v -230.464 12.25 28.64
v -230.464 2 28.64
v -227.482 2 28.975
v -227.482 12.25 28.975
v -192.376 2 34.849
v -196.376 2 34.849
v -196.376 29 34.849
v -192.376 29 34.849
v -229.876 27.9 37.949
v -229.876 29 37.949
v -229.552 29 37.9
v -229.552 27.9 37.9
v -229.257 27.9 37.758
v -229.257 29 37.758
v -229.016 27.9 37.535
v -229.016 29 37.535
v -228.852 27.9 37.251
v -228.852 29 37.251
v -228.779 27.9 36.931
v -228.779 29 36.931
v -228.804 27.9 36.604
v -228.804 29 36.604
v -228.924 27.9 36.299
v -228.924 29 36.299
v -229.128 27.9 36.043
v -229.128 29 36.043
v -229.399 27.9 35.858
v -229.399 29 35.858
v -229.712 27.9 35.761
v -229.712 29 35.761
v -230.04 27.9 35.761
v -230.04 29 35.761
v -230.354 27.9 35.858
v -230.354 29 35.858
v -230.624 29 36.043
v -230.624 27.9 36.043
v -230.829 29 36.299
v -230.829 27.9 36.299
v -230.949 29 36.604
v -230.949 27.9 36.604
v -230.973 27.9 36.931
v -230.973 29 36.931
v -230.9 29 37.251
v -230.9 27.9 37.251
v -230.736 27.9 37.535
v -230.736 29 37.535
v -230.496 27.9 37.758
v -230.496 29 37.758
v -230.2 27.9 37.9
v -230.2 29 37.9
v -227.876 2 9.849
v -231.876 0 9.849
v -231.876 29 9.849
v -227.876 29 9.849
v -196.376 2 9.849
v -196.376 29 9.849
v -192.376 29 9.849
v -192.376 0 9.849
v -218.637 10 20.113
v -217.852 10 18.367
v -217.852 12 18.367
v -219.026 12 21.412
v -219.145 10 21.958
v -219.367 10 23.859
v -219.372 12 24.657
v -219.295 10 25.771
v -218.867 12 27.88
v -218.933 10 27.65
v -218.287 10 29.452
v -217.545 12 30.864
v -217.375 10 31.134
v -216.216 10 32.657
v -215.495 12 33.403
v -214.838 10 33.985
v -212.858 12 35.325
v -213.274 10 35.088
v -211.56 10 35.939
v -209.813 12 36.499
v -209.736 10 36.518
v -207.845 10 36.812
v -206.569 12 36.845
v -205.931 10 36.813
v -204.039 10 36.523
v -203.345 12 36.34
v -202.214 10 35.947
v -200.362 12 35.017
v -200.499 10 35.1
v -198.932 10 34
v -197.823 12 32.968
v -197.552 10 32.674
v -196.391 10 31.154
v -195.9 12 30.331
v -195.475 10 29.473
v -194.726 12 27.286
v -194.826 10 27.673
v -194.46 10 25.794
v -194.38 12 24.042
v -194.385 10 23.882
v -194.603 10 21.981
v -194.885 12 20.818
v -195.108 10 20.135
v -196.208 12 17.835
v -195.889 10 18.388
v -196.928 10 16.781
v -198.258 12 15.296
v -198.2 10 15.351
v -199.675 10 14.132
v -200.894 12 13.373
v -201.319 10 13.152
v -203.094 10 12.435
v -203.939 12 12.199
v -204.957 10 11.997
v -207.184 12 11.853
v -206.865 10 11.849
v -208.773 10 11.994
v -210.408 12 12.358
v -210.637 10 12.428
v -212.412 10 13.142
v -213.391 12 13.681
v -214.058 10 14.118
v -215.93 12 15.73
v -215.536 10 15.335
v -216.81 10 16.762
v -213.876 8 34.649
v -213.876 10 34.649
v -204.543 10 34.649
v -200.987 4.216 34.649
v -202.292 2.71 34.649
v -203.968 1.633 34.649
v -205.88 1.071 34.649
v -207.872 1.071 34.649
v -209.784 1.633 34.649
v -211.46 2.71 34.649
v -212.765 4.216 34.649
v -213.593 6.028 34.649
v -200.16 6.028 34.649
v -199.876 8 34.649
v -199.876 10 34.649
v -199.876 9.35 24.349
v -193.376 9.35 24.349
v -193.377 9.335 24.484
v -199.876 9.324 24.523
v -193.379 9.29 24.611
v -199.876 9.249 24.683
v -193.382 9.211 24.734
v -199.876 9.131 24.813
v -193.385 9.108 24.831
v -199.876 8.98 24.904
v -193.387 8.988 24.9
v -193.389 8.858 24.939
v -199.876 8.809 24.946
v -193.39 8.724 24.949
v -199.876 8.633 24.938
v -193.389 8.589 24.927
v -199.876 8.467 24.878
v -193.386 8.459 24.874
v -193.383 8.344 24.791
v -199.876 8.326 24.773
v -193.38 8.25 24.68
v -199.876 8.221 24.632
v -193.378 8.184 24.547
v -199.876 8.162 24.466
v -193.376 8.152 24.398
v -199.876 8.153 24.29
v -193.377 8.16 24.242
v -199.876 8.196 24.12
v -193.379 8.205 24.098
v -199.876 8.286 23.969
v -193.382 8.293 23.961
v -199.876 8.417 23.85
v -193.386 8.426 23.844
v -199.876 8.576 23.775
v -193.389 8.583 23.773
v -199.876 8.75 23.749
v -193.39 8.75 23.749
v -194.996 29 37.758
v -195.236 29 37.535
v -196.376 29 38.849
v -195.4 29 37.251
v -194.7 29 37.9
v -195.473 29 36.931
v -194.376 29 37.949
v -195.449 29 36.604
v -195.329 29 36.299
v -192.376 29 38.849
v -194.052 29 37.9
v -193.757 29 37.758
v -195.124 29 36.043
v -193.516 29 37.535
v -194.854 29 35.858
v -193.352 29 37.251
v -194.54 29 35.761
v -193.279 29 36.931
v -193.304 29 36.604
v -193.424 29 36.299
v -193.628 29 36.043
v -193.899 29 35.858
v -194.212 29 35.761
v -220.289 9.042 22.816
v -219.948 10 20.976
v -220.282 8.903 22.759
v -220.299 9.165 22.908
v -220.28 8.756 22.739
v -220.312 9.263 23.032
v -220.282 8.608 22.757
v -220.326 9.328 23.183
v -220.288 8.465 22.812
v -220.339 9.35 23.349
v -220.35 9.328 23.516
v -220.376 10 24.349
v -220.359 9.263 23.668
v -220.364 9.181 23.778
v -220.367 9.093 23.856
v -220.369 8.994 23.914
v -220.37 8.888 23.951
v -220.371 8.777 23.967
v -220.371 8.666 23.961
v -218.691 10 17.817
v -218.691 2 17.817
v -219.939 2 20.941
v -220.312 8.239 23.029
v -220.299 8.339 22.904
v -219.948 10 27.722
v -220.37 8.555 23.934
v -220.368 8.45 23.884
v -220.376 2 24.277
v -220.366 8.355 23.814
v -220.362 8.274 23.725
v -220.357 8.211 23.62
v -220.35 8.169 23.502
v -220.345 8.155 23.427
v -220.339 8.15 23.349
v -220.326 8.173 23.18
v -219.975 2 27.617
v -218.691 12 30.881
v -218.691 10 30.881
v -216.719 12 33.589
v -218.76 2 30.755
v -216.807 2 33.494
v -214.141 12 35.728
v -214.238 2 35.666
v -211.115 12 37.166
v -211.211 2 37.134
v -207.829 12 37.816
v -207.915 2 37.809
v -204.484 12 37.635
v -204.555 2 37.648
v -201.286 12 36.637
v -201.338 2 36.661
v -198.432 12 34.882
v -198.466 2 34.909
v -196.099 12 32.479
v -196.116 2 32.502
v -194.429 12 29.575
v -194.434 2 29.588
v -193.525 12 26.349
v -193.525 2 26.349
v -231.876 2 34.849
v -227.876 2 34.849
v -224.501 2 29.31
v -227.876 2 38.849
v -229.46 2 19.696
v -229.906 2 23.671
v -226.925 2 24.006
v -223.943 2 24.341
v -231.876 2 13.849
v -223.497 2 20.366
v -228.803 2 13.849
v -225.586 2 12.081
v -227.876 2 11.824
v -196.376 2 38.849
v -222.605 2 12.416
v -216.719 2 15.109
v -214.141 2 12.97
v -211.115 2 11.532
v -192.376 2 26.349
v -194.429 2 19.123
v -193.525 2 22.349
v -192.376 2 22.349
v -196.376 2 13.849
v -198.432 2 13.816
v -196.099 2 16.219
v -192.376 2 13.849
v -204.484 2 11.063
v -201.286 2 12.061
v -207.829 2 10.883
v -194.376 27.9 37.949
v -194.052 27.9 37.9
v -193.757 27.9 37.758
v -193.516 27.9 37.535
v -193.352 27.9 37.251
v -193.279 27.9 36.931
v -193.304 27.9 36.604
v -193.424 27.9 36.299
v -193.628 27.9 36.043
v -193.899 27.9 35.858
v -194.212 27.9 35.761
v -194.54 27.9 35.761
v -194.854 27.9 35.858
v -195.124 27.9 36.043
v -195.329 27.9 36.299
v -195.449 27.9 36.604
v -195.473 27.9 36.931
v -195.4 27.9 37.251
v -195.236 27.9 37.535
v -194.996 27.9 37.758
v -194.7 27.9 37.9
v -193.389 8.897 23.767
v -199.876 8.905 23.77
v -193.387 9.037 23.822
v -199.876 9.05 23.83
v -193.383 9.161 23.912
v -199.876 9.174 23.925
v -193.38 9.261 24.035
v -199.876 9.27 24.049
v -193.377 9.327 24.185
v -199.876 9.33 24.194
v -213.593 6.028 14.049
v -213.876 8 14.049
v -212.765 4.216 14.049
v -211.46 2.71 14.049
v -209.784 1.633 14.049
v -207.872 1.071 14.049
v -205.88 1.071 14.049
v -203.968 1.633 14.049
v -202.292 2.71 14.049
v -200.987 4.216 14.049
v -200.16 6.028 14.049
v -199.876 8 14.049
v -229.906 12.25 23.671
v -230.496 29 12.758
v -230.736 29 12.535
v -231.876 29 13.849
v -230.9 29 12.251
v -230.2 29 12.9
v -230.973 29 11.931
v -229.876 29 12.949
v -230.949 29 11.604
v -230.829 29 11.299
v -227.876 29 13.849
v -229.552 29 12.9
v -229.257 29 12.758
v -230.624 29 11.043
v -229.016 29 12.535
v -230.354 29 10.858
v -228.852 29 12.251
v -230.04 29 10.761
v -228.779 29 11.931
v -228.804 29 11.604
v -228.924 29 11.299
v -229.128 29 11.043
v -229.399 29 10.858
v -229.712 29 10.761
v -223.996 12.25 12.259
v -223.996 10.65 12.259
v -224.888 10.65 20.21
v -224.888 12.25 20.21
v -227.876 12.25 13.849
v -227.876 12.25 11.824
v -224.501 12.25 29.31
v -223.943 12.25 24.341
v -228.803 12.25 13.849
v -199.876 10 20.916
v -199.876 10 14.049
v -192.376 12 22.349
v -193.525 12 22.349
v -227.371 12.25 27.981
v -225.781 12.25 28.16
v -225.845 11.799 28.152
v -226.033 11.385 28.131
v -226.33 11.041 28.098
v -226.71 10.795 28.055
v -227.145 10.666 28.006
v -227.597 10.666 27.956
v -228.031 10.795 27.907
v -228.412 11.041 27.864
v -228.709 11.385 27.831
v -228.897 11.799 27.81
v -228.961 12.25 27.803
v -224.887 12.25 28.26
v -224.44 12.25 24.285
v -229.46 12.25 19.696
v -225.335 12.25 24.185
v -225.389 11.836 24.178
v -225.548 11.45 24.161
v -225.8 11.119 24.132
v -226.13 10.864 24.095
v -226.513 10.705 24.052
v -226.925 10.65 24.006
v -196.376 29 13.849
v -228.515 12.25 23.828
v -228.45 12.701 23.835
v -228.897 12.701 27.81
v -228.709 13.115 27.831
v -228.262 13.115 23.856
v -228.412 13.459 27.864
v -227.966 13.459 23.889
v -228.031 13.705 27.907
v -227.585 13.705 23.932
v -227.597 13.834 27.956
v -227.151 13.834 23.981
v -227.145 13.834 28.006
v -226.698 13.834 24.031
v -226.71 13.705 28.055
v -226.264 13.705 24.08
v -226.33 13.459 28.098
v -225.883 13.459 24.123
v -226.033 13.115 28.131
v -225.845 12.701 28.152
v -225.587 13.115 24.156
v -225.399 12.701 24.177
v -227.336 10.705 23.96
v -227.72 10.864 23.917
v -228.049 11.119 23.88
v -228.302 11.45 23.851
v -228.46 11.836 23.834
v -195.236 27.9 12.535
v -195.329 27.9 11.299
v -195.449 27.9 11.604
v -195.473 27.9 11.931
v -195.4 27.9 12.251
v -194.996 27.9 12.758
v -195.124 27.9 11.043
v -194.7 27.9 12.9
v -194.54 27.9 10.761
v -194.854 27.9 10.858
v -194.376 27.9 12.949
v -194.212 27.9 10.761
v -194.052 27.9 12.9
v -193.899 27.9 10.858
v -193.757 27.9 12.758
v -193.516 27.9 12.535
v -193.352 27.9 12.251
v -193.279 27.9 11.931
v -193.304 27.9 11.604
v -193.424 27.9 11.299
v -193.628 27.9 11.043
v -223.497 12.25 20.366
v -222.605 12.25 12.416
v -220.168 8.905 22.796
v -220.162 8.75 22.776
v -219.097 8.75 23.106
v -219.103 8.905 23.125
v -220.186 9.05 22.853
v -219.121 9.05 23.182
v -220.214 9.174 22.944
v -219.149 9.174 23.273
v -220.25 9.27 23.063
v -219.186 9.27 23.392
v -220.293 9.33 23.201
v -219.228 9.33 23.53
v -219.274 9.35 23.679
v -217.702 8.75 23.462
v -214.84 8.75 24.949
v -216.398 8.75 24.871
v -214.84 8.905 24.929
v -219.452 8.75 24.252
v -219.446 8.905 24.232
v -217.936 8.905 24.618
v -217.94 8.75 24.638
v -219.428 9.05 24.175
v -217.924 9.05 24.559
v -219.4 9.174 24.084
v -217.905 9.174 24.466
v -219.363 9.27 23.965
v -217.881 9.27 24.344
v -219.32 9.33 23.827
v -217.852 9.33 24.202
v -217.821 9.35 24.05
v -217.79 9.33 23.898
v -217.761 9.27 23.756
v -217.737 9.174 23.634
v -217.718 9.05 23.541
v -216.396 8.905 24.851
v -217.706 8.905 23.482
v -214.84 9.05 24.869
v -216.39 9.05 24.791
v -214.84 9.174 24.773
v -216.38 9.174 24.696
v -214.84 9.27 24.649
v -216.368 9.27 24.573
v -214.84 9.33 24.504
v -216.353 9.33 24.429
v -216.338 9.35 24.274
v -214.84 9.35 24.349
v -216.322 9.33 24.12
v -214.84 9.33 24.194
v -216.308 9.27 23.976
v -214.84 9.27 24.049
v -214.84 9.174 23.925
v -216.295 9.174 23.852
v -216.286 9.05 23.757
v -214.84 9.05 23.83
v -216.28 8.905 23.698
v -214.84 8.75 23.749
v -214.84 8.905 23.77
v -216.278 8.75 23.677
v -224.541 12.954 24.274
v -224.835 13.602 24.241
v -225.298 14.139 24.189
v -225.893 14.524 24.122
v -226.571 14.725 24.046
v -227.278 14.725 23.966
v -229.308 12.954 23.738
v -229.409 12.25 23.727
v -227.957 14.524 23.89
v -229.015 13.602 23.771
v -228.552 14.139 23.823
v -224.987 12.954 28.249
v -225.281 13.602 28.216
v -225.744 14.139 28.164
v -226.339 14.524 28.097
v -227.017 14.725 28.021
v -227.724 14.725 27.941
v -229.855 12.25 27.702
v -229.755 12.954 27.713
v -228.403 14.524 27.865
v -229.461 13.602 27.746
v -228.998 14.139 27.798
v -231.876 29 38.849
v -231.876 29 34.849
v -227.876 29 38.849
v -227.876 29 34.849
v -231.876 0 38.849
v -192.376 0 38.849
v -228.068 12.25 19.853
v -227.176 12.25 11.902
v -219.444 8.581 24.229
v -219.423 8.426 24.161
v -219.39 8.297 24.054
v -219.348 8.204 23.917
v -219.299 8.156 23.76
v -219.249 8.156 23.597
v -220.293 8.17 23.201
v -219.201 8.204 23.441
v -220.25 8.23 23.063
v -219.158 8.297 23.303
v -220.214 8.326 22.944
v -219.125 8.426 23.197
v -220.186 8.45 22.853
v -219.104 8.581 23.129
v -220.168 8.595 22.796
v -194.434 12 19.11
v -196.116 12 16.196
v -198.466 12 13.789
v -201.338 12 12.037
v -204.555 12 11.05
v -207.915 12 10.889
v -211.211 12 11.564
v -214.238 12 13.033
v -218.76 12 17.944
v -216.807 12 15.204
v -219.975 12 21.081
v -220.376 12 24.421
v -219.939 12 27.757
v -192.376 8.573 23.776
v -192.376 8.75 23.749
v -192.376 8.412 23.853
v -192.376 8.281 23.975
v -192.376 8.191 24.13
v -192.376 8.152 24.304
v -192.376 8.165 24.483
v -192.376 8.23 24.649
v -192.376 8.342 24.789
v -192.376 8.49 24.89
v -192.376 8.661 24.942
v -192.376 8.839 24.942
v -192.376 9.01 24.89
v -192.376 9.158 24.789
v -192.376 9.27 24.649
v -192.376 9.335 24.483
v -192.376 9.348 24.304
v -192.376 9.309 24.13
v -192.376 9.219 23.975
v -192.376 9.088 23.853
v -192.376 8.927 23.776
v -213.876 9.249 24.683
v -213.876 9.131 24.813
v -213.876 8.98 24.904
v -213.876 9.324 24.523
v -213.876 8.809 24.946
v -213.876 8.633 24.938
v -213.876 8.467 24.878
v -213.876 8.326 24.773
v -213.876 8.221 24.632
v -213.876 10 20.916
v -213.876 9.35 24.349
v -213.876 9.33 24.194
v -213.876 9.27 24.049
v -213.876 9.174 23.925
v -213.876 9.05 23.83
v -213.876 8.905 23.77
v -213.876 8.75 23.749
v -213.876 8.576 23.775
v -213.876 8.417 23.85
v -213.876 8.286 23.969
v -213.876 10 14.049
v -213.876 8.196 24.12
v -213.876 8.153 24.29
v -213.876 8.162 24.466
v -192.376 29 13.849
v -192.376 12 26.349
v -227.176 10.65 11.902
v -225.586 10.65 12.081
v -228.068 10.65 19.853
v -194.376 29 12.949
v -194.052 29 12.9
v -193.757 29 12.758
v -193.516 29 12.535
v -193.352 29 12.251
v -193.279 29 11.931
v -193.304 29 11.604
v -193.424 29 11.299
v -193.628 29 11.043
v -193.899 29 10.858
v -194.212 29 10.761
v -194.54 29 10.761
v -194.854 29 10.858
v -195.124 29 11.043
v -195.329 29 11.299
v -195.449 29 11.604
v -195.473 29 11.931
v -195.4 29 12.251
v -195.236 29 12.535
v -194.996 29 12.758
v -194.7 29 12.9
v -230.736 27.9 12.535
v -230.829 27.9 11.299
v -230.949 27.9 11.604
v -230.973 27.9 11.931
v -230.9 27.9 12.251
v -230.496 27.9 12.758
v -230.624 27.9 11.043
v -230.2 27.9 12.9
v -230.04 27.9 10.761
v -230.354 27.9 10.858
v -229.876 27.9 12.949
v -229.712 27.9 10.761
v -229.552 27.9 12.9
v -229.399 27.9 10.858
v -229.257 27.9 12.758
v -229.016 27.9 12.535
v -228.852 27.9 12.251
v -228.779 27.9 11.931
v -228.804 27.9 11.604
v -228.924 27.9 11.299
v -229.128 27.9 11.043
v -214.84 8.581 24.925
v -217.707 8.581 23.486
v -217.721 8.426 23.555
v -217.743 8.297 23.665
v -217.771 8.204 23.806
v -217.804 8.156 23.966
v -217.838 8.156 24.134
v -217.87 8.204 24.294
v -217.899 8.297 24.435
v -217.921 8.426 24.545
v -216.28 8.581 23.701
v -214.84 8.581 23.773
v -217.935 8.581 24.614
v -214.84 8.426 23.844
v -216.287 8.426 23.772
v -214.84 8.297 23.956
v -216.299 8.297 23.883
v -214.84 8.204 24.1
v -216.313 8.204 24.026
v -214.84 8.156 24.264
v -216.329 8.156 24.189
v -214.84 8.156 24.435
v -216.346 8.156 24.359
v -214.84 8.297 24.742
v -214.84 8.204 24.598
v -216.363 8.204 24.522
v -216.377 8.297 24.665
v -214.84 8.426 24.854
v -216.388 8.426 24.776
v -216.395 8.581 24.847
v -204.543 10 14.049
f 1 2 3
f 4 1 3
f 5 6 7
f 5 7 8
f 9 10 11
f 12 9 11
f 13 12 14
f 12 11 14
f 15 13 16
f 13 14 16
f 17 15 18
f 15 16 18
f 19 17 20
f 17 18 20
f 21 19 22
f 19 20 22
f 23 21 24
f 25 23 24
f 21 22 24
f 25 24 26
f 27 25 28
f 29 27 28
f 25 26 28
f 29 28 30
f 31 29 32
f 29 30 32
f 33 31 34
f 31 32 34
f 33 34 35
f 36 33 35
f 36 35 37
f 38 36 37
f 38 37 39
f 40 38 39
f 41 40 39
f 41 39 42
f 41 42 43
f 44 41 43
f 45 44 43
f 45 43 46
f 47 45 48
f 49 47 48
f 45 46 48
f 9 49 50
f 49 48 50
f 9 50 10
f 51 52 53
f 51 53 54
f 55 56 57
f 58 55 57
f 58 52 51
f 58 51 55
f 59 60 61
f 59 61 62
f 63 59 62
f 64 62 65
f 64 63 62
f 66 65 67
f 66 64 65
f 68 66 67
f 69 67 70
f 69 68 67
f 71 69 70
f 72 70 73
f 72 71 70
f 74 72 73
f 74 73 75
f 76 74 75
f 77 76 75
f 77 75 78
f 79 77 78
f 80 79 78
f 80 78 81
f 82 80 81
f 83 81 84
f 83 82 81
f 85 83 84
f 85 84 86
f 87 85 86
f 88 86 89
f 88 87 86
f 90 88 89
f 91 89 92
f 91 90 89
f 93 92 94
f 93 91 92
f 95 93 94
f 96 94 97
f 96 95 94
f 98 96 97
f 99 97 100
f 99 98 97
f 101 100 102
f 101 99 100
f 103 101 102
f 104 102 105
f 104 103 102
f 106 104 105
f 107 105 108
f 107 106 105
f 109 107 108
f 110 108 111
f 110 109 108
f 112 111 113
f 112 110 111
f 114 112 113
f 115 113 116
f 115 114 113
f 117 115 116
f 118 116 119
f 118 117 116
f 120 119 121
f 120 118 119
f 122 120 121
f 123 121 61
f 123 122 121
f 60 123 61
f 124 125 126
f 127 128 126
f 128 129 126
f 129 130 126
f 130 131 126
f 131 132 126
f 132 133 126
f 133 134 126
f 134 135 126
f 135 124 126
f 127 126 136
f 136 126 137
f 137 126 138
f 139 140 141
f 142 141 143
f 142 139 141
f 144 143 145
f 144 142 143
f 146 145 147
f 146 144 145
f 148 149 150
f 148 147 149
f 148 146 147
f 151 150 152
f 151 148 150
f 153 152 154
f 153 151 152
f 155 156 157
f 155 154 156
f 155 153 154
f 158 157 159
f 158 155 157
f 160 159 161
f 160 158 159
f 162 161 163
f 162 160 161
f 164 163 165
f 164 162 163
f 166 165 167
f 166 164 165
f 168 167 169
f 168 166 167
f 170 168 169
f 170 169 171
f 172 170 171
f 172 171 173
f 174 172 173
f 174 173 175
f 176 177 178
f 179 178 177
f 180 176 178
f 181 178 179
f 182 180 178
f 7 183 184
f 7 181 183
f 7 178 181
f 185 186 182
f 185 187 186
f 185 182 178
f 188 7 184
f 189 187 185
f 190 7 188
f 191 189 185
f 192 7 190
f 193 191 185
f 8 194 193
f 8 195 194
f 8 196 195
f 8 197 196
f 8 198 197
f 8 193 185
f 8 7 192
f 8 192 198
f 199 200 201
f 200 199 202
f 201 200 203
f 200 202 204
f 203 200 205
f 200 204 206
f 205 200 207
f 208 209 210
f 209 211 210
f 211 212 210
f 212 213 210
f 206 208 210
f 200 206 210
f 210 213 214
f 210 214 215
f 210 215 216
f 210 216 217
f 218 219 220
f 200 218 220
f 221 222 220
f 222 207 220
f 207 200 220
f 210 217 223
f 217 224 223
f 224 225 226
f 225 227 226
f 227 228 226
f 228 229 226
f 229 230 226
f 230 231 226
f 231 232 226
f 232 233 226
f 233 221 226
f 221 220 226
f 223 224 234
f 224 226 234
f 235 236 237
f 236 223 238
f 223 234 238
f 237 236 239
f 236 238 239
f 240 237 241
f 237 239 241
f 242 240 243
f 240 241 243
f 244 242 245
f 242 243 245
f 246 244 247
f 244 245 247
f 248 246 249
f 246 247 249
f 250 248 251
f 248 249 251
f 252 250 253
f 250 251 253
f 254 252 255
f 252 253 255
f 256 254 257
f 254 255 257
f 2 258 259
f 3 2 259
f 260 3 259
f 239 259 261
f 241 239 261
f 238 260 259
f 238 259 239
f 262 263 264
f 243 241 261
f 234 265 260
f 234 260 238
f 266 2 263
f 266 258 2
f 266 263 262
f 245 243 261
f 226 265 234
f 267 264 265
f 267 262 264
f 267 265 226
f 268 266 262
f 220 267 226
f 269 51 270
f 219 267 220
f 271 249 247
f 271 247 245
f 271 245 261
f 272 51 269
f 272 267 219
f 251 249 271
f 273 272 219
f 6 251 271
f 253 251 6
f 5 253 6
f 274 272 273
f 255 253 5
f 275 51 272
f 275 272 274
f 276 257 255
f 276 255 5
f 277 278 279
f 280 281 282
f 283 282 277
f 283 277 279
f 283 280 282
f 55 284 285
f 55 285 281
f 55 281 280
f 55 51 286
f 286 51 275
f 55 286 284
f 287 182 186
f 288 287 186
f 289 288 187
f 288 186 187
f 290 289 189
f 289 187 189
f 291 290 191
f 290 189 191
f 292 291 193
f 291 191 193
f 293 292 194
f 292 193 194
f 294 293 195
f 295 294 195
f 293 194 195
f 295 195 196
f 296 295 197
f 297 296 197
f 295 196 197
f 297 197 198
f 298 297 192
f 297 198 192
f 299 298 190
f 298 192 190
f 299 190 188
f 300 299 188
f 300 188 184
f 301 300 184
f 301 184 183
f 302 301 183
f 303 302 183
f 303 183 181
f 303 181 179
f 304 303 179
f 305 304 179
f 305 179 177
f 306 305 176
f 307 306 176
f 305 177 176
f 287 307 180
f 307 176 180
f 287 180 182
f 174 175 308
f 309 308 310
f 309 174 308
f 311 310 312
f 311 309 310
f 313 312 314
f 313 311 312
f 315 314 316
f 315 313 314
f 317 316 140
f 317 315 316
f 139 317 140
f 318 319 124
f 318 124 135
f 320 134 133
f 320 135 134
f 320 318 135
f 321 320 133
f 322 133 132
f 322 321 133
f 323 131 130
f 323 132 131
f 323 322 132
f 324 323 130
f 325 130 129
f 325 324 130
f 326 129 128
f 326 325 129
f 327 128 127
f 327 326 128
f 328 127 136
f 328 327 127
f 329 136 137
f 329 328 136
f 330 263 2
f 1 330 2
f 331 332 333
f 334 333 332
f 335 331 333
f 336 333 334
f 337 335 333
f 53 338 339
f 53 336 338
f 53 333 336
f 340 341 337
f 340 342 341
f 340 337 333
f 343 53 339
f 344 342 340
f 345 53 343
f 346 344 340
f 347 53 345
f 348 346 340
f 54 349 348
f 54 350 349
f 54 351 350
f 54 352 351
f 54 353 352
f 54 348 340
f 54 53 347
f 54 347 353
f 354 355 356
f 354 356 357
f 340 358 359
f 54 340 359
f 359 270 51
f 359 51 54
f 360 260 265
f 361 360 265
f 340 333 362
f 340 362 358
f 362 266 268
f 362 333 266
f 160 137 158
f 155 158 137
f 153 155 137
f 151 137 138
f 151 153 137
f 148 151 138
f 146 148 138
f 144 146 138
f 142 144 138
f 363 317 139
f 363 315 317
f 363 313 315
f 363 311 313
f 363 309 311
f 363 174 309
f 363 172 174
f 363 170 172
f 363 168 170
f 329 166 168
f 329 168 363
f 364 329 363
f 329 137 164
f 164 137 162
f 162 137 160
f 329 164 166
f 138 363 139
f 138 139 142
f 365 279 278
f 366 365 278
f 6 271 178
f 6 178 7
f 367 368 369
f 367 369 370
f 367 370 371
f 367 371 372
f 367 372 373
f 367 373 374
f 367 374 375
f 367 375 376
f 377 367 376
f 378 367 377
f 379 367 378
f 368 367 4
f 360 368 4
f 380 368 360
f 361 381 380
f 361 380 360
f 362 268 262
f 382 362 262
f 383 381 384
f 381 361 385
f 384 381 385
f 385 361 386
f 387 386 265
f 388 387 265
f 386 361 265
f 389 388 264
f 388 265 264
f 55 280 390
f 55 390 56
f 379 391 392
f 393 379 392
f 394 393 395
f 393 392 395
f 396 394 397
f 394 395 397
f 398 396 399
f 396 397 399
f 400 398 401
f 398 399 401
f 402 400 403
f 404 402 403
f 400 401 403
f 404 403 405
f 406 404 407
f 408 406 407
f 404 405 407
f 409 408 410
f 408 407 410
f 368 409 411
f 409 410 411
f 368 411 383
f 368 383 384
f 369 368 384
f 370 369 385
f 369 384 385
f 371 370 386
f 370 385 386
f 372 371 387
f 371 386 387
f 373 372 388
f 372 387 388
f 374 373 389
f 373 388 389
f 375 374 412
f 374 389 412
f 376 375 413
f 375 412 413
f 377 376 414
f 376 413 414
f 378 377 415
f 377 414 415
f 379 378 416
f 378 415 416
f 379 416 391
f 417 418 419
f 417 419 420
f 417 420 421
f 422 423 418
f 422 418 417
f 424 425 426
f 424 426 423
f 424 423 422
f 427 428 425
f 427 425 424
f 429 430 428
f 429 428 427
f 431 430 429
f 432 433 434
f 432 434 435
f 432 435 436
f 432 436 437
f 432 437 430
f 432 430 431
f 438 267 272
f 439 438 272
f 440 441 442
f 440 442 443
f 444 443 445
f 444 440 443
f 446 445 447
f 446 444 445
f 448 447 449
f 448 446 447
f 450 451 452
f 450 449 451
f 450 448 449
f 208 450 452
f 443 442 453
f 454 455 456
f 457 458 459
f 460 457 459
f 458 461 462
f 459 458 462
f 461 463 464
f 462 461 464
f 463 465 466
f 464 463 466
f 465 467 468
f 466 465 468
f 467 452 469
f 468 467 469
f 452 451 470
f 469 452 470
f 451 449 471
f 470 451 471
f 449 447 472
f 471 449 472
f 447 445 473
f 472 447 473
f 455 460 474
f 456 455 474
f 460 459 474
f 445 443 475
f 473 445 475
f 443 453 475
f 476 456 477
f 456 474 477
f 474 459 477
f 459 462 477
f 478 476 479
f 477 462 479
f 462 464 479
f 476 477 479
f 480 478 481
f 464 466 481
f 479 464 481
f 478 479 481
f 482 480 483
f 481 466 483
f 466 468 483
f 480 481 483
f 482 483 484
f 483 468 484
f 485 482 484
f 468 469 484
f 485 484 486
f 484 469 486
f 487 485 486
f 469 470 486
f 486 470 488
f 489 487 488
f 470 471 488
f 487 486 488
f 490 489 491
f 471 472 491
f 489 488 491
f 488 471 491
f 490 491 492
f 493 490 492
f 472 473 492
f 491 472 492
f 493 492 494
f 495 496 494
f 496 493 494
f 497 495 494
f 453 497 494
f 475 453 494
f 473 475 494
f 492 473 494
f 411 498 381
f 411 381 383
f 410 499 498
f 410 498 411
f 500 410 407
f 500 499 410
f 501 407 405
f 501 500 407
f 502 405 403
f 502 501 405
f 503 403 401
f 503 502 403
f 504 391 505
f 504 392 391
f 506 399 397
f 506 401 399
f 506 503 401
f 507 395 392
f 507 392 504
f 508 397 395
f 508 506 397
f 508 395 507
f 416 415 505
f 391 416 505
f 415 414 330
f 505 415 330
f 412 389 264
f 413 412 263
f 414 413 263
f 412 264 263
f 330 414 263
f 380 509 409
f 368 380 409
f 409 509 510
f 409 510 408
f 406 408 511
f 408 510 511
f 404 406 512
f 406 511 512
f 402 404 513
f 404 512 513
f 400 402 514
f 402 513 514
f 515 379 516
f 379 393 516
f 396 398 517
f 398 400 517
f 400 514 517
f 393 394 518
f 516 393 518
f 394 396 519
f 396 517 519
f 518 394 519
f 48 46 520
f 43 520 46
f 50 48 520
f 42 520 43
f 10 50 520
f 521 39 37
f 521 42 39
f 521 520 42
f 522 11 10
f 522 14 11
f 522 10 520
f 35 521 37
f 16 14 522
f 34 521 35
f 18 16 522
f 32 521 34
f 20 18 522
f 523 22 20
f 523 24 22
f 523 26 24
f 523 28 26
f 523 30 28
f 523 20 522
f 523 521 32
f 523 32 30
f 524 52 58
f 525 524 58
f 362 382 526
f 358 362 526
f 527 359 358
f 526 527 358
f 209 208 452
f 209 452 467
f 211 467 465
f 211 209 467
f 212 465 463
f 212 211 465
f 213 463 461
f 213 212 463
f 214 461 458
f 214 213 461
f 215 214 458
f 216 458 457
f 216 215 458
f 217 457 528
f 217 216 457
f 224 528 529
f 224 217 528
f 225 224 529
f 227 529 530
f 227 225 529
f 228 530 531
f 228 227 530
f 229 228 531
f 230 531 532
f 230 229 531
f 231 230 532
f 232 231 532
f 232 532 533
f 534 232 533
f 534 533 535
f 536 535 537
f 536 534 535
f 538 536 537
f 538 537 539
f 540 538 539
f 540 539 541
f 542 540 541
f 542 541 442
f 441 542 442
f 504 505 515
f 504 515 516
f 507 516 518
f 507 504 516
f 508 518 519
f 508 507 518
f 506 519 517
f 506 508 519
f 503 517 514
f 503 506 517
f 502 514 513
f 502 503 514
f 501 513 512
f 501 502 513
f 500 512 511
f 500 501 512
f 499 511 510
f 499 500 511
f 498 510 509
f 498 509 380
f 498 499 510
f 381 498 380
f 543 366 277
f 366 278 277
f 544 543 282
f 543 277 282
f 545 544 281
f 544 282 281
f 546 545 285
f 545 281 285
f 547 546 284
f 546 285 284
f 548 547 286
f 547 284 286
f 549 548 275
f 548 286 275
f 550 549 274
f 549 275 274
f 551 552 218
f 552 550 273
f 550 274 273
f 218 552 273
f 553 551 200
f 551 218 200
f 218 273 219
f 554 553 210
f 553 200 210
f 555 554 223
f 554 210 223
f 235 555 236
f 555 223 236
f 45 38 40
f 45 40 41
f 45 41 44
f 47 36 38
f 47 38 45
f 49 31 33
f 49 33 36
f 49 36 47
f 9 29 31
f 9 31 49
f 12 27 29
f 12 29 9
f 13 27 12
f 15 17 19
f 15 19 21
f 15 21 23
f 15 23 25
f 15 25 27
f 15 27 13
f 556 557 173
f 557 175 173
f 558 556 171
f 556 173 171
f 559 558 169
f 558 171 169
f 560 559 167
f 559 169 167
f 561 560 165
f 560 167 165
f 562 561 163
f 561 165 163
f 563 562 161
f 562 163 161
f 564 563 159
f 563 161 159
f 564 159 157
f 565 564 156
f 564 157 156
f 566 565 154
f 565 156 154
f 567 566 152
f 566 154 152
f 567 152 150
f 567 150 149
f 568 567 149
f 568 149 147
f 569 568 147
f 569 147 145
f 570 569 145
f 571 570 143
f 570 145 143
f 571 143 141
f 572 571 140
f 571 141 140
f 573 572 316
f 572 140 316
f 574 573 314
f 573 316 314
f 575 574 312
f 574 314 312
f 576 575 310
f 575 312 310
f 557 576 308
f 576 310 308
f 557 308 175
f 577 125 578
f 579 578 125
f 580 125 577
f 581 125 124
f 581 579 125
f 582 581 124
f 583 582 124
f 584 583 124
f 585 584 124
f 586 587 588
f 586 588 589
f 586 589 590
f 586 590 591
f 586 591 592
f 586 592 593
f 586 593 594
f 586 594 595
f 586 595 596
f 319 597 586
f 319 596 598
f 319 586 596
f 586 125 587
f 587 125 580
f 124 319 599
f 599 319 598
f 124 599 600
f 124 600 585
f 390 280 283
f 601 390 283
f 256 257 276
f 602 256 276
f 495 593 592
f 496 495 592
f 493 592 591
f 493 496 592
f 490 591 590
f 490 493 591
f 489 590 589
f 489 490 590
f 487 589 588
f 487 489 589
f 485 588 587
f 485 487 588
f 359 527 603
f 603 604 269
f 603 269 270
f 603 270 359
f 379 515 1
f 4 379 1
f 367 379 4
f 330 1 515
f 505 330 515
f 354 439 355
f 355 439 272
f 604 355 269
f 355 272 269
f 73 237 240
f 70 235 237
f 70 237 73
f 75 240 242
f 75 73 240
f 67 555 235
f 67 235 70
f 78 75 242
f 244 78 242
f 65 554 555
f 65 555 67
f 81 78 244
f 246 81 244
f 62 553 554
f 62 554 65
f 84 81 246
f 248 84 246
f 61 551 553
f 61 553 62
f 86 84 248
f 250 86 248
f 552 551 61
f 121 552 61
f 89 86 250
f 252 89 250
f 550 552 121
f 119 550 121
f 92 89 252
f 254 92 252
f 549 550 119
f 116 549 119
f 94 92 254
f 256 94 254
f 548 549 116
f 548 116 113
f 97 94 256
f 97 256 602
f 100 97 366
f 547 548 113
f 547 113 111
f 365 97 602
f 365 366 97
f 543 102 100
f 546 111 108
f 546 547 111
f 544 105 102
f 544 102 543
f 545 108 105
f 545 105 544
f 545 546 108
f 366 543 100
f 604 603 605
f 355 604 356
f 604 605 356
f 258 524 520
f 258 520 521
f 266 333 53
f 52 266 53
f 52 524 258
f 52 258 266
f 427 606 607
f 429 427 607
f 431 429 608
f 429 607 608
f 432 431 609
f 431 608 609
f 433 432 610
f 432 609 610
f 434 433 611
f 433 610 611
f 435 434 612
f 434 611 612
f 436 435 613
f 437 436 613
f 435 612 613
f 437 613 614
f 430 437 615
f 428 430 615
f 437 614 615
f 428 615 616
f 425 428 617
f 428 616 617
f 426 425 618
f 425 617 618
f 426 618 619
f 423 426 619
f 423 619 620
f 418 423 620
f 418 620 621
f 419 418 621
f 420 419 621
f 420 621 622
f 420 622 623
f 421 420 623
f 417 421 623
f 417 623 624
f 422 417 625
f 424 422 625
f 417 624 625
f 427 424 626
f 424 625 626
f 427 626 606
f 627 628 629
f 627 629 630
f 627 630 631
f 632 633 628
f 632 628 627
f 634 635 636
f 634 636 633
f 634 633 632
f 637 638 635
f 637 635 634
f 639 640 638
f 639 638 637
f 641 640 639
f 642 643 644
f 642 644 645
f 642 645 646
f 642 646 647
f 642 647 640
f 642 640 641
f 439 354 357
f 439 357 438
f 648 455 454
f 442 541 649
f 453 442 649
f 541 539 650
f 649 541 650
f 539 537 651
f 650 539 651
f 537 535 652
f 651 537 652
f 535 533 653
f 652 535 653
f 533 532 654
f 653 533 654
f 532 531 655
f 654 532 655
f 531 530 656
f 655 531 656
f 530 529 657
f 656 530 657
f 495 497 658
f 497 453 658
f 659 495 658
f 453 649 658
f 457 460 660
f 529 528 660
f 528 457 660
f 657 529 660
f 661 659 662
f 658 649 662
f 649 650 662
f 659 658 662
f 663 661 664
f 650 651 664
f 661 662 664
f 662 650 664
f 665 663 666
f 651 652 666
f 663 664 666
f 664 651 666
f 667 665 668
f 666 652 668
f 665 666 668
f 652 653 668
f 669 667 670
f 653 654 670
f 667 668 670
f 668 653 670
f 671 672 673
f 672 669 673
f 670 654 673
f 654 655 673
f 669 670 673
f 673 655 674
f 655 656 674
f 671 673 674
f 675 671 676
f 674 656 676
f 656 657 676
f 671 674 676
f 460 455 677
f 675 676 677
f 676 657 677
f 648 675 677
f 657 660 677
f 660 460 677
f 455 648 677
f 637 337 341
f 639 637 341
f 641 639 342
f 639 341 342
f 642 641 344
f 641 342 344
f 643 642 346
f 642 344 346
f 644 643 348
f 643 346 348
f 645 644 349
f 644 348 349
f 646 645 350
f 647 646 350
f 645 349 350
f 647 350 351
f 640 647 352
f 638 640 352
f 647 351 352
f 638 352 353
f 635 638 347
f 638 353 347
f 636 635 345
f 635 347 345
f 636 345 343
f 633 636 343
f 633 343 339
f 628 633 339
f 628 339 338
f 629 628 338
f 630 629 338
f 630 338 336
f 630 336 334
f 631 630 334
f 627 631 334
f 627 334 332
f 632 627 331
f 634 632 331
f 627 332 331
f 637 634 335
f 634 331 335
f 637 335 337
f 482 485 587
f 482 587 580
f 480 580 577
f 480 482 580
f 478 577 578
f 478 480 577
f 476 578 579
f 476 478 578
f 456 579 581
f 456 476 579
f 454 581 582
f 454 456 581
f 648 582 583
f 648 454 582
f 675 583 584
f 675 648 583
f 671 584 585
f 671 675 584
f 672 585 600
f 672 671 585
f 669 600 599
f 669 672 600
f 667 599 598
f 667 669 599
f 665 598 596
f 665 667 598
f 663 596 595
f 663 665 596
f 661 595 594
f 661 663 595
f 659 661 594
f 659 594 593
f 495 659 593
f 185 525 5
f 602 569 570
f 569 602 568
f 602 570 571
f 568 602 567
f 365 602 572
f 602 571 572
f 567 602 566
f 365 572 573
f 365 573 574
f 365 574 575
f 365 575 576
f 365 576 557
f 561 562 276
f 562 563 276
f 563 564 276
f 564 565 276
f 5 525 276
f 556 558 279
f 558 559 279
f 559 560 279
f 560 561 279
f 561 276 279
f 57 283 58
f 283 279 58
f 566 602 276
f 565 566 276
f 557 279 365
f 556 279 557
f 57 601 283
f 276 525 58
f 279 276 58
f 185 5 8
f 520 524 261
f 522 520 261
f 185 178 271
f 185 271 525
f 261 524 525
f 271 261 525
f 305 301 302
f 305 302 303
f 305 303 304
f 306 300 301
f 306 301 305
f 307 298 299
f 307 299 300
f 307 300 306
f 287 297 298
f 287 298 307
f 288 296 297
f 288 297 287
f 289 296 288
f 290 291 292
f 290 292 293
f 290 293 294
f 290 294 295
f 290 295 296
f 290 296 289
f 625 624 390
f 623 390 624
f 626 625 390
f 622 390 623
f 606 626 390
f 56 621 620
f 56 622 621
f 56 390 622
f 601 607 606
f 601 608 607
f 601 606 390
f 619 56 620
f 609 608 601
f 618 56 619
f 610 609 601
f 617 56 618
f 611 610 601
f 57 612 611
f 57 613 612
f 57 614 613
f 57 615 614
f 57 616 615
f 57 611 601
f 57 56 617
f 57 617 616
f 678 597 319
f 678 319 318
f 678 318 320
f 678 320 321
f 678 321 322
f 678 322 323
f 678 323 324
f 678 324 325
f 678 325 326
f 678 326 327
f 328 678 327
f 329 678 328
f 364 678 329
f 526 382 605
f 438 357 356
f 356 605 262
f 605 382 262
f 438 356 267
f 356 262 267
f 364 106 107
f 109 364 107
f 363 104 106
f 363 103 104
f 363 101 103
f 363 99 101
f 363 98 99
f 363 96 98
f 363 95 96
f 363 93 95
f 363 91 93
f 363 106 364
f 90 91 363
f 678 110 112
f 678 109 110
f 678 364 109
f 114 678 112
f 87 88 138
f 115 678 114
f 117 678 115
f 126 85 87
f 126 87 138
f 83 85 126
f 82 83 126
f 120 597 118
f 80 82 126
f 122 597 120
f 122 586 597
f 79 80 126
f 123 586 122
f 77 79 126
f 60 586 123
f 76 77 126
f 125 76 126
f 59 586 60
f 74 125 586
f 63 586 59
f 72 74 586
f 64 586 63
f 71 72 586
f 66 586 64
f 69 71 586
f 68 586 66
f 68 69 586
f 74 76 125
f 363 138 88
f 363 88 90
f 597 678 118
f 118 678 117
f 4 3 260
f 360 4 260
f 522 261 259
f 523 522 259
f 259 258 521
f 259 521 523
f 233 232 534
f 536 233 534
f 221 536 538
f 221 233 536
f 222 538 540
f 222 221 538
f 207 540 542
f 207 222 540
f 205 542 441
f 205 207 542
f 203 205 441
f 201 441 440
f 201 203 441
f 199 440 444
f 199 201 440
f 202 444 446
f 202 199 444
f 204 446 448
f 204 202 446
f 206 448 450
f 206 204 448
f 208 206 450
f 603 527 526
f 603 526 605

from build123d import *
from build123d.topology import SkipClean

# Parameters (mm, degrees)
SKETCH1_W              = 39.5
SKETCH1_H              = 29
BOSS_EXTRUDE1_DEPTH    = 2
SKETCH2_R              = 13.5
SKETCH2_R_2            = 8.5
BOSS_EXTRUDE2_DEPTH    = 10
SKETCH3_R              = 12.5
CUT_EXTRUDE1_DEPTH     = 2
SKETCH4_R              = 7.5
CUT_EXTRUDE2_DEPTH     = 9
CUT_EXTRUDE3_START     = -10.3
CUT_EXTRUDE3_DEPTH     = 20.6
BOSS_EXTRUDE3_DEPTH    = 10
SKETCH10_W             = 39.5
SKETCH10_H             = 29
SKETCH10_R             = 13.5
CUT_EXTRUDE4_DEPTH     = 10
SKETCH11_R             = 13.5
SKETCH11_W             = 14
SKETCH11_H             = 20.6
BOSS_EXTRUDE4_DEPTH    = 8
SKETCH12_R             = 13.5
SKETCH12_R_2           = 12.5
BOSS_EXTRUDE5_DEPTH    = 2
CUT_SWEEP2_START       = -214.83981443
CUT_SWEEP2_OUTLINE_R   = 0.6
CUT_SWEEP2_DEPTH       = 22.83981443
CUT_SWEEP2_2_OUTLINE_R = 0.6
CUT_SWEEP2_2_ANGLE     = 17.195102
CUT_SWEEP2_START_2     = -205
CUT_SWEEP2_3_OUTLINE_R = 0.6
CUT_SWEEP2_3_DEPTH     = 2.526605635
BOSS_EXTRUDE7_DEPTH    = 10.25
CUT_EXTRUDE5_DEPTH     = 8
SKETCH20_R             = 1.6
CUT_EXTRUDE6_DEPTH     = 4
SKETCH21_R             = 2.5
SKETCH21_R_2           = 1.6
BOSS_EXTRUDE8_DEPTH    = 4
SKETCH22_W             = 4
SKETCH22_H             = 4
BOSS_EXTRUDE9_DEPTH    = 27
BOSS_EXTRUDE11_DEPTH   = 10
SKETCH8_2_R            = 0.6
SKETCH24_R             = 1.1
CUT_EXTRUDE7_DEPTH     = 1.1


with BuildPart() as part:
    # Sketch1 → Boss-Extrude1 (new body)
    with BuildSketch(Plane(origin=(0, 0, 0), x_dir=(1, 0, 0), z_dir=(0, 1, 0))):
        with Locations((-212.126239175, -24.349172792)):
            Rectangle(SKETCH1_W, SKETCH1_H)
    extrude(amount=BOSS_EXTRUDE1_DEPTH)

    # Sketch2 → Boss-Extrude2 (add)
    with BuildSketch(Plane(origin=(0, 2, 0), x_dir=(1, 0, 0), z_dir=(0, 1, 0))):
        with Locations((-206.876239175, -24.349172792)):
            Circle(SKETCH2_R)
        with Locations((-222.376239175, -24.349172792)):
            Circle(SKETCH2_R_2)
    extrude(amount=BOSS_EXTRUDE2_DEPTH)

    # Sketch3 → Cut-Extrude1 (cut)
    with BuildSketch(Plane(origin=(0, 12, 0), x_dir=(1, 0, 0), z_dir=(0, 1, 0))):
        with Locations(Location((-206.876239175, -24.349172792, 0), (0, 0, 270))):
            Circle(SKETCH3_R)
    extrude(amount=-CUT_EXTRUDE1_DEPTH, mode=Mode.SUBTRACT)

    # Sketch4 → Cut-Extrude2 (cut)
    with BuildSketch(Plane(origin=(0, 12, 0), x_dir=(1, 0, 0), z_dir=(0, 1, 0))):
        with Locations(Location((-222.376239175, -24.349172792, 0), (0, 0, 270))):
            Circle(SKETCH4_R)
    extrude(amount=-CUT_EXTRUDE2_DEPTH, mode=Mode.SUBTRACT)

    # Cut-Extrude3: read off the stored shape, not the designer's step
    # Cut-Extrude3 outline → Cut-Extrude3 (cut)
    with BuildSketch(Plane.XY.offset(24.349172792).offset(CUT_EXTRUDE3_START)):
        with BuildLine():
            ThreePointArc((-213.876239175, 8), (-206.876239175, 1), (-199.876239175, 8))
            Line((-199.876239175, 8), (-199.876239175, 10))
            Line((-199.876239175, 10), (-213.876239175, 10))
            Line((-213.876239175, 10), (-213.876239175, 8))
        make_face()
    extrude(amount=CUT_EXTRUDE3_DEPTH, mode=Mode.SUBTRACT)

    # Sketch7 → Boss-Extrude3 (add)
    with BuildSketch(Plane(origin=(0, 2, 0), x_dir=(1, 0, 0), z_dir=(0, 1, 0))):
        with BuildLine():
            Line((-192.376239175, -26.349172792), (-192.376239175, -24.349172792))
            Line((-192.376239175, -24.349172792), (-192.376239175, -22.349172792))
            Line((-192.376239175, -22.349172792), (-193.525209252, -22.349172792))
            ThreePointArc((-193.525209252, -22.349172792), (-193.413533207, -23.346402619), (-193.376239175, -24.349172792))
            ThreePointArc((-193.376239175, -24.349172792), (-193.413533207, -25.351942966), (-193.525209252, -26.349172792))
            Line((-193.525209252, -26.349172792), (-192.376239175, -26.349172792))
        make_face()
    extrude(amount=BOSS_EXTRUDE3_DEPTH)

    # Sketch10 → Cut-Extrude4 (cut)
    with BuildSketch(Plane(origin=(0, 2, 0), x_dir=(1, 0, 0), z_dir=(0, 1, 0))):
        with Locations((-212.126239175, -24.349172792)):
            Rectangle(SKETCH10_W, SKETCH10_H)
        with Locations(Location((-206.876239175, -24.349172792, 0), (0, 0, 151.062655238))):
            Circle(SKETCH10_R, mode=Mode.SUBTRACT)
    extrude(amount=CUT_EXTRUDE4_DEPTH, mode=Mode.SUBTRACT)

    # Sketch11 → Boss-Extrude4 (add)
    with BuildSketch(Plane(origin=(0, 2, 0), x_dir=(1, 0, 0), z_dir=(0, 1, 0))):
        with Locations(Location((-206.876239175, -24.349172792, 0), (0, 0, 151.062655238))):
            Circle(SKETCH11_R)
        with Locations((-206.876239175, -24.349172792)):
            Rectangle(SKETCH11_W, SKETCH11_H, mode=Mode.SUBTRACT)
    extrude(amount=BOSS_EXTRUDE4_DEPTH)

    # Sketch12 → Boss-Extrude5 (add)
    with SkipClean():  # the faces are left unmerged after this step: merging them gives an invalid solid
        with BuildSketch(Plane(origin=(0, 10, 0), x_dir=(1, 0, 0), z_dir=(0, 1, 0))):
            with Locations(Location((-206.876239175, -24.349172792, 0), (0, 0, 270))):
                Circle(SKETCH12_R)
            with Locations(Location((-206.876239175, -24.349172792, 0), (0, 0, 270))):
                Circle(SKETCH12_R_2, mode=Mode.SUBTRACT)
        extrude(amount=BOSS_EXTRUDE5_DEPTH)
    add(part.part.scale(1), mode=Mode.REPLACE)  # the faces are merged on a copy

    # Cut-Sweep2: read off the stored shape, not the designer's step
    # Cut-Sweep2 outline → Cut-Sweep2 (cut)
    with SkipClean():  # the faces are left unmerged after this step: merging them gives an invalid solid
        with BuildSketch(Plane.YZ.offset(CUT_SWEEP2_START)):
            with Locations((8.75, 24.349172792)):
                Circle(CUT_SWEEP2_OUTLINE_R)
        extrude(amount=CUT_SWEEP2_DEPTH, mode=Mode.SUBTRACT)

    # Cut-Sweep2 2 outline → Cut-Sweep2 2 (revolve, cut)
    with SkipClean():  # the faces are left unmerged after this step: merging them gives an invalid solid
        with BuildSketch(Plane(origin=(-214.83981433, 0, 9.349172792), x_dir=(-0.2956263792524328, 0, 0.9553036396298806), z_dir=(-0.9553036396298806, 0, -0.2956263792524328))):
            with Locations((15, 8.75)):
                Circle(CUT_SWEEP2_2_OUTLINE_R)
        revolve(axis=Axis((-214.83981433, 0, 9.349172792), (0, 1, 0)), revolution_arc=CUT_SWEEP2_2_ANGLE, mode=Mode.SUBTRACT)

    # Cut-Sweep2 3 outline → Cut-Sweep2 3 (cut)
    with SkipClean():  # the faces are left unmerged after this step: merging them gives an invalid solid
        with BuildSketch(Plane(origin=(0, 0, 0), x_dir=(0, 1, 0), z_dir=(0.9553036396298961, 0, 0.29562637925238305)).offset(CUT_SWEEP2_START_2)):
            with Locations((8.75, 87.443615225)):
                Circle(CUT_SWEEP2_3_OUTLINE_R)
        extrude(amount=CUT_SWEEP2_3_DEPTH, mode=Mode.SUBTRACT)

    # Sketch18 → Boss-Extrude7 (add)
    with SkipClean():  # the faces are left unmerged after this step: merging them gives an invalid solid
        with BuildSketch(Plane(origin=(0, 2, 0), x_dir=(1, 0, 0), z_dir=(0, 1, 0))):
            Polygon((-228.567210955, -11.746276031), (-229.459691419, -19.696337579), (-226.478418338, -20.031017753), (-225.585937874, -12.080956204), align=None)
            Polygon((-225.585937874, -12.080956204), (-226.478418338, -20.031017753), (-223.497145257, -20.365697927), (-222.604664794, -12.415636378), align=None)
            Polygon((-227.482458859, -28.974836995), (-226.92465857, -24.006048527), (-229.90593165, -23.671368353), (-230.46373194, -28.640156821), align=None)
            Polygon((-223.943385489, -24.340728701), (-226.92465857, -24.006048527), (-227.482458859, -28.974836995), (-224.501185779, -29.309517169), align=None)
        extrude(amount=BOSS_EXTRUDE7_DEPTH)

    # Sketch19 → Cut-Extrude5 (cut)
    with SkipClean():  # the faces are left unmerged after this step: merging them gives an invalid solid
        with BuildSketch(Plane(origin=(-5.039382401, 0, 44.889946486), x_dir=(0.9937576935397466, 0, 0.11156005795338761), z_dir=(-0.11156005795338761, 0, 0.9937576935397466))):
            Polygon((-222.830009143, 12.25), (-224.430009143, 12.25), (-224.430009143, 10.65), (-221.230009143, 10.65), (-221.230009143, 12.25), align=None)
        extrude(amount=-CUT_EXTRUDE5_DEPTH, mode=Mode.SUBTRACT)

    # Sketch20 → Cut-Extrude6 (cut)
    with SkipClean():  # the faces are left unmerged after this step: merging them gives an invalid solid
        with BuildSketch(Plane(origin=(-5.485622633, 0, 48.864977261), x_dir=(-0.9937576935397466, 0, -0.11156005795338761), z_dir=(0.11156005795338761, 0, -0.9937576935397466))):
            with Locations((222.830009143, 12.25)):
                Circle(SKETCH20_R)
        extrude(amount=-CUT_EXTRUDE6_DEPTH, mode=Mode.SUBTRACT)

    # Sketch21 → Boss-Extrude8 (add)
    with SkipClean():  # the faces are left unmerged after this step: merging them gives an invalid solid
        with BuildSketch(Plane(origin=(-5.485622633, 0, 48.864977261), x_dir=(-0.9937576935397466, 0, -0.11156005795338761), z_dir=(0.11156005795338761, 0, -0.9937576935397466))):
            with Locations((222.830009143, 12.25)):
                Circle(SKETCH21_R)
            with Locations((222.830009143, 12.25)):
                Circle(SKETCH21_R_2, mode=Mode.SUBTRACT)
        extrude(amount=-BOSS_EXTRUDE8_DEPTH)

    # Sketch22 → Boss-Extrude9 (add)
    with SkipClean():  # the faces are left unmerged after this step: merging them gives an invalid solid
        with BuildSketch(Plane(origin=(0, 2, 0), x_dir=(1, 0, 0), z_dir=(0, 1, 0))):
            with Locations((-229.876239175, -11.849172792)):
                Rectangle(SKETCH22_W, SKETCH22_H)
            with Locations((-229.876239175, -36.849172792)):
                Rectangle(SKETCH22_W, SKETCH22_H)
            with Locations((-194.376239175, -36.849172792)):
                Rectangle(SKETCH22_W, SKETCH22_H)
            with Locations((-194.376239175, -11.849172792)):
                Rectangle(SKETCH22_W, SKETCH22_H)
        extrude(amount=BOSS_EXTRUDE9_DEPTH)

    # Sketch23 → Boss-Extrude11 (add)
    with BuildSketch(Plane(origin=(0, 2, 0), x_dir=(1, 0, 0), z_dir=(0, 1, 0))):
        with BuildLine():
            Line((-193.376239175, -24.349172792), (-192.376239175, -24.349172792))
            Line((-192.376239175, -24.349172792), (-192.376239175, -22.349172792))
            Line((-192.376239175, -22.349172792), (-193.525209252, -22.349172792))
            ThreePointArc((-193.525209252, -22.349172792), (-193.413533207, -23.346402619), (-193.376239175, -24.349172792))
        make_face()
        with BuildLine():
            Line((-192.376239175, -26.349172792), (-192.376239175, -24.349172792))
            Line((-192.376239175, -24.349172792), (-193.376239175, -24.349172792))
            ThreePointArc((-193.376239175, -24.349172792), (-193.413533207, -25.351942966), (-193.525209252, -26.349172792))
            Line((-193.525209252, -26.349172792), (-192.376239175, -26.349172792))
        make_face()
    extrude(amount=BOSS_EXTRUDE11_DEPTH)

    # Cut-Sweep3: sweep along a path in Sketch17<2>
    with SkipClean():  # the faces are left unmerged after this step: merging them gives an invalid solid
        with BuildLine(Plane(origin=(0, 8.75, 0), x_dir=(1, 0, 0), z_dir=(0, 1, 0))) as cut_sweep3_path:
            Line((-192.376239175, -24.349172792), (-213.876239175, -24.349172792))
            Line((-213.876239175, -24.349172792), (-214.83981433, -24.349172792))
            ThreePointArc((-214.83981433, -24.349172792), (-217.08221049, -24.180614376), (-219.274210018, -23.678727387))
            Line((-219.274210018, -23.678727387), (-220.339151193, -23.349172792))
        # Sketch8<2> → Cut-Sweep3 (sweep, cut)
        with BuildSketch(Plane(origin=(-192.376239175, 0, 0), x_dir=(0, 0, -1), z_dir=(1, 0, 0))):
            with Locations((-24.349172792, 8.75)):
                Circle(SKETCH8_2_R)
        sweep(path=cut_sweep3_path.line, mode=Mode.SUBTRACT)
    add(part.part.scale(1), mode=Mode.REPLACE)  # the faces are merged on a copy

    # Sketch24 → Cut-Extrude7 (cut)
    with BuildSketch(Plane(origin=(0, 29, 0), x_dir=(1, 0, 0), z_dir=(0, 1, 0))):
        with Locations(Location((-229.876239175, -11.849172792, 0), (0, 0, 270))):
            Circle(SKETCH24_R)
        with Locations(Location((-229.876239175, -36.849172792, 0), (0, 0, 270))):
            Circle(SKETCH24_R)
        with Locations(Location((-194.376239175, -36.849172792, 0), (0, 0, 270))):
            Circle(SKETCH24_R)
        with Locations(Location((-194.376239175, -11.849172792, 0), (0, 0, 270))):
            Circle(SKETCH24_R)
    extrude(amount=-CUT_EXTRUDE7_DEPTH, mode=Mode.SUBTRACT)


solid = part.part
